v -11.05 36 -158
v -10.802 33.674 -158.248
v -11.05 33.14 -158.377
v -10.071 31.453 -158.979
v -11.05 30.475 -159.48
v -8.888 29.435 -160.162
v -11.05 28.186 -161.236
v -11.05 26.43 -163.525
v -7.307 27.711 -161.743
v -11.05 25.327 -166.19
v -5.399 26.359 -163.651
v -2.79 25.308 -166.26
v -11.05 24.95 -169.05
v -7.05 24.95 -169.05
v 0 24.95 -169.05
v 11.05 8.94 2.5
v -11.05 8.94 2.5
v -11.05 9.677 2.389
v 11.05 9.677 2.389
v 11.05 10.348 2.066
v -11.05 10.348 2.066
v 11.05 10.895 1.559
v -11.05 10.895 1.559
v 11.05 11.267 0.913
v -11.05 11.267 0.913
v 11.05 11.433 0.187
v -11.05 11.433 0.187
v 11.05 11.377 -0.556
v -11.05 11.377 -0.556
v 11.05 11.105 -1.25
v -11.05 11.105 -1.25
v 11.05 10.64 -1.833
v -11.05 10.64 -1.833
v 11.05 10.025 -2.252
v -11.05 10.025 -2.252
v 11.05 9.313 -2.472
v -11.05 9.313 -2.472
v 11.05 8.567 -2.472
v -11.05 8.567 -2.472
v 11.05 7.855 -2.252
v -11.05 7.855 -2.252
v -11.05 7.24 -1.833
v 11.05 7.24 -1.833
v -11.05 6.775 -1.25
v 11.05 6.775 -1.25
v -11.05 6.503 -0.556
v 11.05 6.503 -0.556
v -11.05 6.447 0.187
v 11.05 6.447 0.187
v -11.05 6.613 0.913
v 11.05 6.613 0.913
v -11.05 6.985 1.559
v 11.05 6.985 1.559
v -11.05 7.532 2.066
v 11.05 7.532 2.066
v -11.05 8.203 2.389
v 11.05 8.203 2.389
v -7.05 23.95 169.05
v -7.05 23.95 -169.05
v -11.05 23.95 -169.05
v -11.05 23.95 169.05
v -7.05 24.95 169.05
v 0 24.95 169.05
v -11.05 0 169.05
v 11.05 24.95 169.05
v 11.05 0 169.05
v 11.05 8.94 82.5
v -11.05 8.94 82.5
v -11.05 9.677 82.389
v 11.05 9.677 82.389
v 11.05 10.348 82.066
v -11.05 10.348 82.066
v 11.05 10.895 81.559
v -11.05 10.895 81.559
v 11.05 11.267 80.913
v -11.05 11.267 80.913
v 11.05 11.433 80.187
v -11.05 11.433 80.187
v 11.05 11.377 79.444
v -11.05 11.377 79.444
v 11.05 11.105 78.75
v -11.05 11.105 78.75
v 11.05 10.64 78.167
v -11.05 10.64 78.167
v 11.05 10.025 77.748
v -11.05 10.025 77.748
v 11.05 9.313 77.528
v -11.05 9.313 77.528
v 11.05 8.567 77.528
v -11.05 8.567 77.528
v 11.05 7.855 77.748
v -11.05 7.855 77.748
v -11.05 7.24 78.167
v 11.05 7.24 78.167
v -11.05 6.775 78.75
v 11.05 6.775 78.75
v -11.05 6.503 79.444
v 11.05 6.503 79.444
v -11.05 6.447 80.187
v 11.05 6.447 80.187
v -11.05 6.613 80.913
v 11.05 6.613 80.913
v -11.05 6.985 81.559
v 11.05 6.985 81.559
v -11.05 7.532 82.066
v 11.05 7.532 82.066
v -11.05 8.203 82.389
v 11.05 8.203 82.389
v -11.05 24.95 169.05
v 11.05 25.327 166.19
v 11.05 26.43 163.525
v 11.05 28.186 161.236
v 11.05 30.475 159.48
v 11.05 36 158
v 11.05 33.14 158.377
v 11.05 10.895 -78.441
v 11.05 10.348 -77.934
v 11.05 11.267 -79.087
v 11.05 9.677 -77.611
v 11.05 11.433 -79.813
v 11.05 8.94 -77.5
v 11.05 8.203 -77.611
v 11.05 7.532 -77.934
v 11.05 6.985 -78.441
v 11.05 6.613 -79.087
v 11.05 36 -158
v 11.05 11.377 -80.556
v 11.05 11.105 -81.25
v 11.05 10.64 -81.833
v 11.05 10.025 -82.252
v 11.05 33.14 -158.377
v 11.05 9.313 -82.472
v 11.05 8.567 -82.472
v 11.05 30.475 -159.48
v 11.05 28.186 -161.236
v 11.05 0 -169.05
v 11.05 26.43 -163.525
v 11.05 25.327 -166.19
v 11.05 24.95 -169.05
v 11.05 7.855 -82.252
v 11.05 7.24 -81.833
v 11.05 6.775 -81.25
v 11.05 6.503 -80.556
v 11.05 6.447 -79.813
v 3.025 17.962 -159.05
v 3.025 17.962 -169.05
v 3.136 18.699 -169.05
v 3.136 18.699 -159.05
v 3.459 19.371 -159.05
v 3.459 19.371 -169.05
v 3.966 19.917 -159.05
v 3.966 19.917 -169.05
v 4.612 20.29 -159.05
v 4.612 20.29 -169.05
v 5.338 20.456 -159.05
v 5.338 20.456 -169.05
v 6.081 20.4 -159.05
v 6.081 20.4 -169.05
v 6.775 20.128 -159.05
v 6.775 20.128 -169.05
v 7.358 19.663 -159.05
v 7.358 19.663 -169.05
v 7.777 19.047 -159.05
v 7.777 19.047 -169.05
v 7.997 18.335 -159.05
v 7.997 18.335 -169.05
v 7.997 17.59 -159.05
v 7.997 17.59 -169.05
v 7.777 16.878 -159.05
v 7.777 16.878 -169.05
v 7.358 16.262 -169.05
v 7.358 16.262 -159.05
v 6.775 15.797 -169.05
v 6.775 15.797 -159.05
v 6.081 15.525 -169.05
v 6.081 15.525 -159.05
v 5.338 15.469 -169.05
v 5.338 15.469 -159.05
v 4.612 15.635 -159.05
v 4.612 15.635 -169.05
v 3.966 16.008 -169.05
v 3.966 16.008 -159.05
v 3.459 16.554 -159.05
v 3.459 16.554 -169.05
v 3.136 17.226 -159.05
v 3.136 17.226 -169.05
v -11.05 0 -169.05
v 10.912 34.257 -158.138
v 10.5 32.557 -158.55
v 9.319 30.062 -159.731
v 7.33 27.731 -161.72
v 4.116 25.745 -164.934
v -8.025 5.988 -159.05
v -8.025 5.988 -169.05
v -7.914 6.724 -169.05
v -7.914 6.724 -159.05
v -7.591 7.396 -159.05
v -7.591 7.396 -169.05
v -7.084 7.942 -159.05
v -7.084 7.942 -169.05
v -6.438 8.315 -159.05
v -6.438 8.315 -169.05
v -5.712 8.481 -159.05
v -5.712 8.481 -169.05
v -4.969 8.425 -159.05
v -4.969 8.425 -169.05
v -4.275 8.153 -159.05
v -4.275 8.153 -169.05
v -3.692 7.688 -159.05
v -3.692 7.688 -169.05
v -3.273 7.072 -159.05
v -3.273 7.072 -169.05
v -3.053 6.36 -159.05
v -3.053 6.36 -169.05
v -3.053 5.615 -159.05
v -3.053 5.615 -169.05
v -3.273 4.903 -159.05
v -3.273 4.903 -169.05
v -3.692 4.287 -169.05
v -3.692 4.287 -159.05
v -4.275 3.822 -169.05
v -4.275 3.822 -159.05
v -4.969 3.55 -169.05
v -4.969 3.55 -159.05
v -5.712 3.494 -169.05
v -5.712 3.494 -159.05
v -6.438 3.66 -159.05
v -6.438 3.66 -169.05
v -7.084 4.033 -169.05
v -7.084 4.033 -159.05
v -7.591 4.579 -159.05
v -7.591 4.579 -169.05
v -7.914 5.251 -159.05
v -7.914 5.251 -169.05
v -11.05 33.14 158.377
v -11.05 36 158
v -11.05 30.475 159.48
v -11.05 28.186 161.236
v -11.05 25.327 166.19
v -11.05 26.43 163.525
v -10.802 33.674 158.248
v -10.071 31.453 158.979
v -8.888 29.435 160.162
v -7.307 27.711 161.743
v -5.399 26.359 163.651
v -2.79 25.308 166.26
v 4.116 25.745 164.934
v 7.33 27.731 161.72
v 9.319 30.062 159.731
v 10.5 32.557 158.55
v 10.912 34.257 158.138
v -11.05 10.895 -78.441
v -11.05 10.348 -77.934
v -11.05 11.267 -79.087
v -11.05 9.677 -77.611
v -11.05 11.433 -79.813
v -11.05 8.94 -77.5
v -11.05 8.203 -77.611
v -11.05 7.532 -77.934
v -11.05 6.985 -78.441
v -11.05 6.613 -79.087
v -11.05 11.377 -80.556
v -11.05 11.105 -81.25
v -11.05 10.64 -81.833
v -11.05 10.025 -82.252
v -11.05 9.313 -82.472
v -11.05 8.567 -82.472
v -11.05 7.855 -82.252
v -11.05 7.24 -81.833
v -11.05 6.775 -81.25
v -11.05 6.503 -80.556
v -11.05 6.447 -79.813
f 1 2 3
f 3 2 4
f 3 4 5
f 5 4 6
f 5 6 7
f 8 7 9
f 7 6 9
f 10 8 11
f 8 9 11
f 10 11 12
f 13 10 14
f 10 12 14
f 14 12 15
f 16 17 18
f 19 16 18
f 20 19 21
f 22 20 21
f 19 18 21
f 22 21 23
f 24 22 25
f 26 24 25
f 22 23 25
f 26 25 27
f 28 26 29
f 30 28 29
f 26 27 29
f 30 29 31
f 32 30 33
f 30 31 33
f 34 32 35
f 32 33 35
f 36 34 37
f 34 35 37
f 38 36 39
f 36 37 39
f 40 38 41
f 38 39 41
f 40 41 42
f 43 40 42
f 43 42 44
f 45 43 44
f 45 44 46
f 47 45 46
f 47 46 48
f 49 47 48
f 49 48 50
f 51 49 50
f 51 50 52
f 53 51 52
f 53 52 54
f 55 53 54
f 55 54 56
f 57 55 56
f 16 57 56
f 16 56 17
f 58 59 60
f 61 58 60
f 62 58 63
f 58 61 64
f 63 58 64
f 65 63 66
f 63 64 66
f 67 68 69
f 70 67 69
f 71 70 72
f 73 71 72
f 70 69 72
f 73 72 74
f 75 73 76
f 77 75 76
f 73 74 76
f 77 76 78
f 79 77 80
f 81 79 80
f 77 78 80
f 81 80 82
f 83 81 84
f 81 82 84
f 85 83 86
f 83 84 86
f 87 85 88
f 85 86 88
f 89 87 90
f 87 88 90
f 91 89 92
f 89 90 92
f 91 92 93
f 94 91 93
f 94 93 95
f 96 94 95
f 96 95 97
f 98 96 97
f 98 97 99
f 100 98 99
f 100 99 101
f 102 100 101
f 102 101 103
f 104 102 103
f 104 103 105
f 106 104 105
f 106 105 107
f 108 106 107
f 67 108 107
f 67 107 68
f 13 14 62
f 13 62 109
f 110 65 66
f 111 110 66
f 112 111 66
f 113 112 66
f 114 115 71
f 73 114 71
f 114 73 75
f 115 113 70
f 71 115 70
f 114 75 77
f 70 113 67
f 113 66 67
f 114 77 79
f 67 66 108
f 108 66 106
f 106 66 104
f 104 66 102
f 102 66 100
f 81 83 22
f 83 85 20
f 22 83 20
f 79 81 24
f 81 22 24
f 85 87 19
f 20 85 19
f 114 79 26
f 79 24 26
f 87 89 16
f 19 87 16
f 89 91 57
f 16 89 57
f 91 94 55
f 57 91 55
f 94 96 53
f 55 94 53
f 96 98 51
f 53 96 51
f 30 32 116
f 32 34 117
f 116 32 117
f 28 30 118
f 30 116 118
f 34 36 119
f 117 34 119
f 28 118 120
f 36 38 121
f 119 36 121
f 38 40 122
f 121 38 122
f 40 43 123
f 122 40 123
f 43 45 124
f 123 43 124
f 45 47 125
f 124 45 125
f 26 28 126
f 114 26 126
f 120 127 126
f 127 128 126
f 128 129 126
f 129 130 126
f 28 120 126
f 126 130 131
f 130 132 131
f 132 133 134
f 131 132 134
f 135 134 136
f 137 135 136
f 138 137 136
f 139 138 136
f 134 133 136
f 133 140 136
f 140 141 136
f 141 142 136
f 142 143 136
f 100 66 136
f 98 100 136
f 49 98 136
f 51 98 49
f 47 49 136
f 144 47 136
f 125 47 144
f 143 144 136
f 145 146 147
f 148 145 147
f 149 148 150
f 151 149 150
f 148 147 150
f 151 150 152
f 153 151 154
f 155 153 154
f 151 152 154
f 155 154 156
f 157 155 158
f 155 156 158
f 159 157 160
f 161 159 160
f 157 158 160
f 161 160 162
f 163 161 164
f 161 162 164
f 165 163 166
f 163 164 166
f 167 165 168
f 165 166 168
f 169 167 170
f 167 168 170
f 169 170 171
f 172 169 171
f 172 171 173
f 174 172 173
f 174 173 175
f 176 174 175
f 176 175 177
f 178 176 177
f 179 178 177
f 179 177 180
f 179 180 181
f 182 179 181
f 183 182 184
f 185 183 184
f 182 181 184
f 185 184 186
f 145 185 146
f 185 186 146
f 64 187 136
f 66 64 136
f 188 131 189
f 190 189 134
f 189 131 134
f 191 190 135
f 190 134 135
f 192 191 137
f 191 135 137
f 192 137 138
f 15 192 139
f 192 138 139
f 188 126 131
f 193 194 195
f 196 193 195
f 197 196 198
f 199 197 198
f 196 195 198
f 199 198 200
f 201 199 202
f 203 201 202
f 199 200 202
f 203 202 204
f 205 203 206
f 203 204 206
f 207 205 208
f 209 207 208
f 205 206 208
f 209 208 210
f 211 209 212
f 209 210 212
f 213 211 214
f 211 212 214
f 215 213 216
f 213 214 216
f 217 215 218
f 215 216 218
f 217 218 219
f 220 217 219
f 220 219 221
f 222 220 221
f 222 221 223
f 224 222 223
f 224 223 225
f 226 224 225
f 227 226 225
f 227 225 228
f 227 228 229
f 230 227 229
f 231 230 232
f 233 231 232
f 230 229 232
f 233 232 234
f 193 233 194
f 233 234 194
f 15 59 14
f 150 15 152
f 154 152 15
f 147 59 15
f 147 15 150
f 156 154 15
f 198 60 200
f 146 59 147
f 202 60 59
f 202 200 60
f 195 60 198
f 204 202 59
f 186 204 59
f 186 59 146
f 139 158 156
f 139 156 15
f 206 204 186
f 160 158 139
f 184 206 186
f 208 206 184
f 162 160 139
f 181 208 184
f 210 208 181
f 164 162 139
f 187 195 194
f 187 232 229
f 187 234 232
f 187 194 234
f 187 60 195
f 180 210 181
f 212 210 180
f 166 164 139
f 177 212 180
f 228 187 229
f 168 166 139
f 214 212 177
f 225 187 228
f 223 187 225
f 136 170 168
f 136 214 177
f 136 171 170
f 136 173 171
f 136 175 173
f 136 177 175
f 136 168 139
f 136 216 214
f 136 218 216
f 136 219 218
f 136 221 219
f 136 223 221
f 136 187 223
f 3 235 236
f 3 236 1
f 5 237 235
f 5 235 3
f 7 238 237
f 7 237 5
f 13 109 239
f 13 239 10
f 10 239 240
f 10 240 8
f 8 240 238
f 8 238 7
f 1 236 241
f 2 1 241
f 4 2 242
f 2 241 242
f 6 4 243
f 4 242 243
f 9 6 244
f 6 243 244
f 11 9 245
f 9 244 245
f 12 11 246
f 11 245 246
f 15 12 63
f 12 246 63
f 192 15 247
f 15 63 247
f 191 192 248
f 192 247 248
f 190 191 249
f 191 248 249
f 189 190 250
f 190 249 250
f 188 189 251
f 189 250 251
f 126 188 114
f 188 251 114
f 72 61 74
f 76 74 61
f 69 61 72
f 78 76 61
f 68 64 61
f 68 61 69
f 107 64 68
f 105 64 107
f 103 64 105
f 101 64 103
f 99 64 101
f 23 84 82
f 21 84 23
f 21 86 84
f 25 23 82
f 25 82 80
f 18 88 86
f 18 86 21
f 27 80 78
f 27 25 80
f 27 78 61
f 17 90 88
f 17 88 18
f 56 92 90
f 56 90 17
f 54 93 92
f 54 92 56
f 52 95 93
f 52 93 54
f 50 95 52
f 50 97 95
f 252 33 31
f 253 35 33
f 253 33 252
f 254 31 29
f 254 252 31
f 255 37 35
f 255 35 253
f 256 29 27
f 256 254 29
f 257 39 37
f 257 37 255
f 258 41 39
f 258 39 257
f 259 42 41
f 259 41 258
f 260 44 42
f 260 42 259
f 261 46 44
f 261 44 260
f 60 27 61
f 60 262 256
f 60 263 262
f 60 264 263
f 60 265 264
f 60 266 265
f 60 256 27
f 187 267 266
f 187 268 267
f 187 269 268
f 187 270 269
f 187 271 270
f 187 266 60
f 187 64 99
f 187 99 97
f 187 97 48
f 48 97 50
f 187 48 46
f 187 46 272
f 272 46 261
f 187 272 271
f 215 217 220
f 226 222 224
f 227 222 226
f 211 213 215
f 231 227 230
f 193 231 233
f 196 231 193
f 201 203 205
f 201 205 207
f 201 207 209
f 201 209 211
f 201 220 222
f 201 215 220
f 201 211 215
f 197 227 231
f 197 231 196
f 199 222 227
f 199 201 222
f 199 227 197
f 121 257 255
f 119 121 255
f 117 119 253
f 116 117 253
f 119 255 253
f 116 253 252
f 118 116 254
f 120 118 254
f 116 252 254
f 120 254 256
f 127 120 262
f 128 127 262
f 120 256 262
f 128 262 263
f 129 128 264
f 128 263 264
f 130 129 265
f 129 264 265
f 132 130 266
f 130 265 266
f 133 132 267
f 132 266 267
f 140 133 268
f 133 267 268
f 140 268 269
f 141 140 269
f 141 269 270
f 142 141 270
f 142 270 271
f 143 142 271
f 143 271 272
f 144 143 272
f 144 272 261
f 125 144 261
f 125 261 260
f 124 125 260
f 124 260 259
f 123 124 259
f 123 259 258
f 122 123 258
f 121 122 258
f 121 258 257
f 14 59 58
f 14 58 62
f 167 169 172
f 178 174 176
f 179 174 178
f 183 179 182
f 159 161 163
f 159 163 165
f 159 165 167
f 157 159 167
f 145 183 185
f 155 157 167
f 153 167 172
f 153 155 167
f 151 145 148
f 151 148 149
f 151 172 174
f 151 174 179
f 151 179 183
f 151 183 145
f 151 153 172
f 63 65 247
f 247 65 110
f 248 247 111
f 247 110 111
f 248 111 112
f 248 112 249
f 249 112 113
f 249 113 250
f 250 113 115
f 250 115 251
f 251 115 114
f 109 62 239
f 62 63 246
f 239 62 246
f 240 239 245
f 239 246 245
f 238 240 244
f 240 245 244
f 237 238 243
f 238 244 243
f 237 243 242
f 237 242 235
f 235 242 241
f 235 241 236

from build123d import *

# Parameters (mm, degrees)
SKETCH1_W             = 22.1
SKETCH1_H             = 338.1
BOSS_EXTRUDE1_DEPTH   = 36
CUT_EXTRUDE1_REACH    = 342.191
SKETCH2_R             = 11.05
SKETCH3_R             = 11.05
CUT_EXTRUDE2_DEPTH    = 175.247847906
F_5_0MM_DOWEL_HOLE4_D = 5
SKETCH16_W            = 4
SKETCH16_H            = 1
CUT_EXTRUDE3_DEPTH    = 341.190700196
SKETCH19_R            = 2.5
CUT_EXTRUDE4_DEPTH    = 10


with BuildPart() as part:
    # Sketch1 → Boss-Extrude1 (new body)
    with BuildSketch(Plane(origin=(0, 0, 0), x_dir=(1, 0, 0), z_dir=(0, 1, 0))):
        Rectangle(SKETCH1_W, SKETCH1_H)
    extrude(amount=BOSS_EXTRUDE1_DEPTH)

    # Sketch2 → Cut-Extrude1 (cut, up to next)
    with BuildSketch(Plane.XY.offset(169.05), mode=Mode.PRIVATE) as cut_extrude1_sk1:
        with Locations((0, 36)):
            Circle(SKETCH2_R)
    cut_extrude1_tool1 = extrude(cut_extrude1_sk1.sketch, amount=-CUT_EXTRUDE1_REACH, mode=Mode.PRIVATE) & part.part
    add(cut_extrude1_tool1.solids().sort_by_distance((0, 36, 169.05))[0], mode=Mode.SUBTRACT)

    # Sketch3 → Cut-Extrude2 (cut, through all)
    with BuildSketch(Plane(origin=(11.05, 0, 0), x_dir=(0, 0, -1), z_dir=(1, 0, 0))):
        with Locations((-169.05, 36)):
            Circle(SKETCH3_R)
        with Locations((169.05, 36)):
            Circle(SKETCH3_R)
    extrude(amount=-CUT_EXTRUDE2_DEPTH, mode=Mode.SUBTRACT)

    # Ø5.0mm Dowel Hole4 (through all)
    with Locations(Plane(origin=(11.05, 0, 0), x_dir=(0, 0, -1), z_dir=(1, 0, 0))):
        with Locations((-80, 8.94), (0, 8.94), (80, 8.94)):
            Hole(F_5_0MM_DOWEL_HOLE4_D / 2)

    # Sketch16 → Cut-Extrude3 (cut, through all)
    with BuildSketch(Plane(origin=(0, 0, -169.05), x_dir=(-1, 0, 0), z_dir=(0, 0, -1))):
        with Locations((9.05, 24.45)):
            Rectangle(SKETCH16_W, SKETCH16_H)
    extrude(amount=-CUT_EXTRUDE3_DEPTH, mode=Mode.SUBTRACT)

    # Sketch19 → Cut-Extrude4 (cut)
    with BuildSketch(Plane(origin=(0, 0, -169.05), x_dir=(-1, 0, 0), z_dir=(0, 0, -1))):
        with Locations((-5.525, 17.9625)):
            Circle(SKETCH19_R)
        with Locations((5.525, 5.9875)):
            Circle(SKETCH19_R)
    extrude(amount=-CUT_EXTRUDE4_DEPTH, mode=Mode.SUBTRACT)


solid = part.part
